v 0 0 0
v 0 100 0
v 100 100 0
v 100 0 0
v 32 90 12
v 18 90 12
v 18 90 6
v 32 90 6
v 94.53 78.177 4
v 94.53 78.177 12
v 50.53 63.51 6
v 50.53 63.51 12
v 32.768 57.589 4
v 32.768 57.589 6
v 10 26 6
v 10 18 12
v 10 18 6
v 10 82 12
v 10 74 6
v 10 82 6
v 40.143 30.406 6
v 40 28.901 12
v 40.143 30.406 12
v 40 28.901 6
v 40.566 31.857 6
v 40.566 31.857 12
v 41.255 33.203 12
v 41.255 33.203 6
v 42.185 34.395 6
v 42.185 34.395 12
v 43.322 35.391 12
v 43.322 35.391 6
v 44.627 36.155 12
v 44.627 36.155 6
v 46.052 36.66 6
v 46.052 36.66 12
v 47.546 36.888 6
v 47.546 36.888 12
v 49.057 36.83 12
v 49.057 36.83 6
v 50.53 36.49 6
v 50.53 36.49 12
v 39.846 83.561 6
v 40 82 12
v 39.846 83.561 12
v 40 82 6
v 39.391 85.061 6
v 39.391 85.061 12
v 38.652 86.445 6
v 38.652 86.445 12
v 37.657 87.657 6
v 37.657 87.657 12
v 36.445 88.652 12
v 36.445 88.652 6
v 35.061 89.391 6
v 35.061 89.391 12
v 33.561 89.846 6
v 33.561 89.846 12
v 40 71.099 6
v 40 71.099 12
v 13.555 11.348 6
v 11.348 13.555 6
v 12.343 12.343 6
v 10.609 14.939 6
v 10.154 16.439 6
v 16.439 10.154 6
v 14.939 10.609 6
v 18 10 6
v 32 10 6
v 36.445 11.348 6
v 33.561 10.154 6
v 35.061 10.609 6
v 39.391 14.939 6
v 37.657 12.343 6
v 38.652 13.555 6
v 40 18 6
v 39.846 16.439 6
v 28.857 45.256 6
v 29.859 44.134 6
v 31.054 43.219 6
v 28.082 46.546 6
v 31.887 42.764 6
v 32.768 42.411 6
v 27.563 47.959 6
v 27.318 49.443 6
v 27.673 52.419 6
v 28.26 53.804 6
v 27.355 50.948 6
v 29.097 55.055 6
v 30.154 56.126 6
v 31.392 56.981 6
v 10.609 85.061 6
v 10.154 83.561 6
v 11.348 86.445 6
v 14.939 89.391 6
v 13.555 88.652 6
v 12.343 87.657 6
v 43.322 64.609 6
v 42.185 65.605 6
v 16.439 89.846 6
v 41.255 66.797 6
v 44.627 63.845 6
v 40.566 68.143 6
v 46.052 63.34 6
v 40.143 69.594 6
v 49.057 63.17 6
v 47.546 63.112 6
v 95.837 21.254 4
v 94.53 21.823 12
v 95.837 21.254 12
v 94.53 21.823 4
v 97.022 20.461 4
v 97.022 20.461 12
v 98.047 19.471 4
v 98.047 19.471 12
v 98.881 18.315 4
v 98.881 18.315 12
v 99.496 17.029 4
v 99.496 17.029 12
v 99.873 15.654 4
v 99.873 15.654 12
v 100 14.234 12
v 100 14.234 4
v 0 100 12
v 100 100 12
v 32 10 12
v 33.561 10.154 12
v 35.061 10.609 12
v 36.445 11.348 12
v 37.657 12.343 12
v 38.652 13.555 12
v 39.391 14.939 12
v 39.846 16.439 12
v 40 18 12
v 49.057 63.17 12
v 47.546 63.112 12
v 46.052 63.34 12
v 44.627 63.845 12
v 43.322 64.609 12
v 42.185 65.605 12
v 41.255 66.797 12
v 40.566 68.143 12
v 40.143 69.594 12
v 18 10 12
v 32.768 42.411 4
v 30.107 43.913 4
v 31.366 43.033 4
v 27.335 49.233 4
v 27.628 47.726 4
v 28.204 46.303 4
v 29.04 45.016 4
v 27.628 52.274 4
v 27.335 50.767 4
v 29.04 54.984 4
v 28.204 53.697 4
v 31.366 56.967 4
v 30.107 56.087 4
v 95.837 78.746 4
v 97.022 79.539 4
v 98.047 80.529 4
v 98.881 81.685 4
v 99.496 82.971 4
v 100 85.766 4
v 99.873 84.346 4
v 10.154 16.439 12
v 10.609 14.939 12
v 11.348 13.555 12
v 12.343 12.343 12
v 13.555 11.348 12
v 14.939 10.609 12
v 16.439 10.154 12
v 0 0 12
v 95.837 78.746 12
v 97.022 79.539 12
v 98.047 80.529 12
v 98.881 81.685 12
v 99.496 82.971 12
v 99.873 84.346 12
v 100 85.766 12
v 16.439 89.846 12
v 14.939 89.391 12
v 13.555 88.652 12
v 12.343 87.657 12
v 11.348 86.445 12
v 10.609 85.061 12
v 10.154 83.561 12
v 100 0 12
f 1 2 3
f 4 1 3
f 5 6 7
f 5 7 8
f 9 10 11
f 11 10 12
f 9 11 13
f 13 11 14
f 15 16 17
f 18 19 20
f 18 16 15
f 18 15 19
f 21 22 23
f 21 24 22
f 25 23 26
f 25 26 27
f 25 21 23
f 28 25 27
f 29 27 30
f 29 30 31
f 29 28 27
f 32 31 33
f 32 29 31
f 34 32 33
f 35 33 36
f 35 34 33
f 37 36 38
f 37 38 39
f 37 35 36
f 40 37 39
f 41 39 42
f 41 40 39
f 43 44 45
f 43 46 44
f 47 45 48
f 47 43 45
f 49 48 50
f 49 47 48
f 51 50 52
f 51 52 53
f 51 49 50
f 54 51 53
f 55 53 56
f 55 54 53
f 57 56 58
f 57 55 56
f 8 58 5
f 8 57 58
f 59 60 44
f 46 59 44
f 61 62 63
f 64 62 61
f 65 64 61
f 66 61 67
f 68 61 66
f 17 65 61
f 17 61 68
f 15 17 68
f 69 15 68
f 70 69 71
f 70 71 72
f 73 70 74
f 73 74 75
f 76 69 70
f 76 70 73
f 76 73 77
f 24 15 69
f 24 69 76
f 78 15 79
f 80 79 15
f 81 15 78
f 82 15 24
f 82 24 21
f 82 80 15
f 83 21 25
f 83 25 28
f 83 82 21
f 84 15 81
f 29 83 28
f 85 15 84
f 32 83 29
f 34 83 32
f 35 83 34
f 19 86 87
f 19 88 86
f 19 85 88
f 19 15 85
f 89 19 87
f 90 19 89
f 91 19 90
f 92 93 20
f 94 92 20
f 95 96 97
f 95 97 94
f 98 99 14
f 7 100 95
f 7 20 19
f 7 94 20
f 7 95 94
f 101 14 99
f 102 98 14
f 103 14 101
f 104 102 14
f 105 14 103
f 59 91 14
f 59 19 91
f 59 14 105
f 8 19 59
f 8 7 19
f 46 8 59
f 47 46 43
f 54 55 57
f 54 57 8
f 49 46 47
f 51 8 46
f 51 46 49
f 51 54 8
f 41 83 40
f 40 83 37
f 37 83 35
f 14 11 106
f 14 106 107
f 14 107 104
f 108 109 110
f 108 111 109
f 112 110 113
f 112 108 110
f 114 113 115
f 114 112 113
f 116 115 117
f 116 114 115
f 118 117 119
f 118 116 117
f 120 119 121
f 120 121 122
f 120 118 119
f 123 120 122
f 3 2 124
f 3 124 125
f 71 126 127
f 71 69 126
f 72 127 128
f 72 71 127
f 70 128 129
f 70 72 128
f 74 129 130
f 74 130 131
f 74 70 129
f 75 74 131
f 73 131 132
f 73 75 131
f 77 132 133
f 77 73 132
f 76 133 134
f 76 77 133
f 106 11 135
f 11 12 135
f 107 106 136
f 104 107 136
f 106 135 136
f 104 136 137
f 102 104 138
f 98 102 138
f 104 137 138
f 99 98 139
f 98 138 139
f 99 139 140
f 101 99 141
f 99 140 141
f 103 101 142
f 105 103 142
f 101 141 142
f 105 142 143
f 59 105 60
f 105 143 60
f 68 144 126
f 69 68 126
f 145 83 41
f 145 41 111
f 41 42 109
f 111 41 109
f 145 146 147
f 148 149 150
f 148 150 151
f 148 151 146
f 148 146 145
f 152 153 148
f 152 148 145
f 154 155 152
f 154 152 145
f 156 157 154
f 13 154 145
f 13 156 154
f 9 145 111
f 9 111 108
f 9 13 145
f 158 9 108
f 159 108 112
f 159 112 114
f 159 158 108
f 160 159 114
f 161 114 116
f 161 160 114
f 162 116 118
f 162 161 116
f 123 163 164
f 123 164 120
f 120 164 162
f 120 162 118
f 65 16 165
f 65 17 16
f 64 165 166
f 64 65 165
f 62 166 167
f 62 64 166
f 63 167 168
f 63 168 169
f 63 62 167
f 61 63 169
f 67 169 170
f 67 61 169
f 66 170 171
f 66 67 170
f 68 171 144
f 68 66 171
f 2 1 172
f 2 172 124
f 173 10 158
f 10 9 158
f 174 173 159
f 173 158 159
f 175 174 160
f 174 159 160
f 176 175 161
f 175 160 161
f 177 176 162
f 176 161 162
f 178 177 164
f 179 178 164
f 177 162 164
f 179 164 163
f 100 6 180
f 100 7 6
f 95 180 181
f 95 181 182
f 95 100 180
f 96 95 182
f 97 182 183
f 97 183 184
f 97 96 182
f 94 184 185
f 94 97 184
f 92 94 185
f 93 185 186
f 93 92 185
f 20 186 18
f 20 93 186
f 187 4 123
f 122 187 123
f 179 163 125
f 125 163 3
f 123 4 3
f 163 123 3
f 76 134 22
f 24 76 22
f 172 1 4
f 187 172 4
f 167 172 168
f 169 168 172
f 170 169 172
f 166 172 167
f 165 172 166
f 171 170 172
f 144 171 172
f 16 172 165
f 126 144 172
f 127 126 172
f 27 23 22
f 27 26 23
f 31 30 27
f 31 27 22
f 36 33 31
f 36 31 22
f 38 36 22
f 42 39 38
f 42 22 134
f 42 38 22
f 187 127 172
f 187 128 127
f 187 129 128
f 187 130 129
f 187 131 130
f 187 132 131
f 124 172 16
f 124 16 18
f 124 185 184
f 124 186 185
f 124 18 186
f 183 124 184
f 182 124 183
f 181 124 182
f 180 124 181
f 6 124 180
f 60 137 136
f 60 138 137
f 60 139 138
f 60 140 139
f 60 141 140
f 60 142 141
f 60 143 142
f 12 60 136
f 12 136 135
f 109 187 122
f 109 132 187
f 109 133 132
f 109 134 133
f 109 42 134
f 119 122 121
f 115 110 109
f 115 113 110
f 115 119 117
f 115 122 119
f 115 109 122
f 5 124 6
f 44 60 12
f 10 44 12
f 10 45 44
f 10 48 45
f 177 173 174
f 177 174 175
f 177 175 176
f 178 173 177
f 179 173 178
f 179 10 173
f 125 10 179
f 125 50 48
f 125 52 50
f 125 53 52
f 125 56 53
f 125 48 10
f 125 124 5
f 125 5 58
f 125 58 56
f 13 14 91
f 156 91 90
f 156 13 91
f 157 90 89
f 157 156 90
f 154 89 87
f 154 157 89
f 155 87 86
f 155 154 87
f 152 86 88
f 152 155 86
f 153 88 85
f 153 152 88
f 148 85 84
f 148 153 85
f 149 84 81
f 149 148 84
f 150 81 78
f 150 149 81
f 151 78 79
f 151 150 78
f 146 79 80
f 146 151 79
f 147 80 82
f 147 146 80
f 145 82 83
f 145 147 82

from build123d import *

# Parameters (mm, degrees)
F0_W     = 100
F0_H     = 100
F1_DEPTH = 12
F2_W     = 30
F2_H     = 80
F3_DEPTH = 6
F5_DEPTH = 8
F6_R     = 8


with BuildPart() as f1:
    # F0 (on Top) → F1 (new body)
    with BuildSketch(Plane.XY):
        with Locations((50, 50)):
            Rectangle(F0_W, F0_H)
    extrude(amount=F1_DEPTH)

    # F2 (on face) → F3 (cut)
    with BuildSketch(Plane.XY.offset(12)):
        with Locations((25, 50)):
            Rectangle(F2_W, F2_H)
    extrude(amount=-F3_DEPTH, mode=Mode.SUBTRACT)

    # F4 (on face) → F5 (cut)
    with BuildSketch(Plane.XY.offset(12)):
        Polygon((100, 80), (40, 60), (40, 40), (100, 20), align=None)
        Polygon((40, 60), (10, 50), (40, 40), align=None)
    extrude(amount=-F5_DEPTH, mode=Mode.SUBTRACT)

    # F6
    f6_edges = [f1.edges().sort_by_distance(p)[0] for p in [
        (10, 50, 5),
        (10, 90, 9),
        (10, 10, 9),
        (40, 90, 9),
        (40, 10, 9),
        (100, 20, 8),
        (100, 80, 8),
        (40, 60, 9),
        (40, 40, 9),
    ]]
    fillet(f6_edges, radius=F6_R)


solid = f1.part
